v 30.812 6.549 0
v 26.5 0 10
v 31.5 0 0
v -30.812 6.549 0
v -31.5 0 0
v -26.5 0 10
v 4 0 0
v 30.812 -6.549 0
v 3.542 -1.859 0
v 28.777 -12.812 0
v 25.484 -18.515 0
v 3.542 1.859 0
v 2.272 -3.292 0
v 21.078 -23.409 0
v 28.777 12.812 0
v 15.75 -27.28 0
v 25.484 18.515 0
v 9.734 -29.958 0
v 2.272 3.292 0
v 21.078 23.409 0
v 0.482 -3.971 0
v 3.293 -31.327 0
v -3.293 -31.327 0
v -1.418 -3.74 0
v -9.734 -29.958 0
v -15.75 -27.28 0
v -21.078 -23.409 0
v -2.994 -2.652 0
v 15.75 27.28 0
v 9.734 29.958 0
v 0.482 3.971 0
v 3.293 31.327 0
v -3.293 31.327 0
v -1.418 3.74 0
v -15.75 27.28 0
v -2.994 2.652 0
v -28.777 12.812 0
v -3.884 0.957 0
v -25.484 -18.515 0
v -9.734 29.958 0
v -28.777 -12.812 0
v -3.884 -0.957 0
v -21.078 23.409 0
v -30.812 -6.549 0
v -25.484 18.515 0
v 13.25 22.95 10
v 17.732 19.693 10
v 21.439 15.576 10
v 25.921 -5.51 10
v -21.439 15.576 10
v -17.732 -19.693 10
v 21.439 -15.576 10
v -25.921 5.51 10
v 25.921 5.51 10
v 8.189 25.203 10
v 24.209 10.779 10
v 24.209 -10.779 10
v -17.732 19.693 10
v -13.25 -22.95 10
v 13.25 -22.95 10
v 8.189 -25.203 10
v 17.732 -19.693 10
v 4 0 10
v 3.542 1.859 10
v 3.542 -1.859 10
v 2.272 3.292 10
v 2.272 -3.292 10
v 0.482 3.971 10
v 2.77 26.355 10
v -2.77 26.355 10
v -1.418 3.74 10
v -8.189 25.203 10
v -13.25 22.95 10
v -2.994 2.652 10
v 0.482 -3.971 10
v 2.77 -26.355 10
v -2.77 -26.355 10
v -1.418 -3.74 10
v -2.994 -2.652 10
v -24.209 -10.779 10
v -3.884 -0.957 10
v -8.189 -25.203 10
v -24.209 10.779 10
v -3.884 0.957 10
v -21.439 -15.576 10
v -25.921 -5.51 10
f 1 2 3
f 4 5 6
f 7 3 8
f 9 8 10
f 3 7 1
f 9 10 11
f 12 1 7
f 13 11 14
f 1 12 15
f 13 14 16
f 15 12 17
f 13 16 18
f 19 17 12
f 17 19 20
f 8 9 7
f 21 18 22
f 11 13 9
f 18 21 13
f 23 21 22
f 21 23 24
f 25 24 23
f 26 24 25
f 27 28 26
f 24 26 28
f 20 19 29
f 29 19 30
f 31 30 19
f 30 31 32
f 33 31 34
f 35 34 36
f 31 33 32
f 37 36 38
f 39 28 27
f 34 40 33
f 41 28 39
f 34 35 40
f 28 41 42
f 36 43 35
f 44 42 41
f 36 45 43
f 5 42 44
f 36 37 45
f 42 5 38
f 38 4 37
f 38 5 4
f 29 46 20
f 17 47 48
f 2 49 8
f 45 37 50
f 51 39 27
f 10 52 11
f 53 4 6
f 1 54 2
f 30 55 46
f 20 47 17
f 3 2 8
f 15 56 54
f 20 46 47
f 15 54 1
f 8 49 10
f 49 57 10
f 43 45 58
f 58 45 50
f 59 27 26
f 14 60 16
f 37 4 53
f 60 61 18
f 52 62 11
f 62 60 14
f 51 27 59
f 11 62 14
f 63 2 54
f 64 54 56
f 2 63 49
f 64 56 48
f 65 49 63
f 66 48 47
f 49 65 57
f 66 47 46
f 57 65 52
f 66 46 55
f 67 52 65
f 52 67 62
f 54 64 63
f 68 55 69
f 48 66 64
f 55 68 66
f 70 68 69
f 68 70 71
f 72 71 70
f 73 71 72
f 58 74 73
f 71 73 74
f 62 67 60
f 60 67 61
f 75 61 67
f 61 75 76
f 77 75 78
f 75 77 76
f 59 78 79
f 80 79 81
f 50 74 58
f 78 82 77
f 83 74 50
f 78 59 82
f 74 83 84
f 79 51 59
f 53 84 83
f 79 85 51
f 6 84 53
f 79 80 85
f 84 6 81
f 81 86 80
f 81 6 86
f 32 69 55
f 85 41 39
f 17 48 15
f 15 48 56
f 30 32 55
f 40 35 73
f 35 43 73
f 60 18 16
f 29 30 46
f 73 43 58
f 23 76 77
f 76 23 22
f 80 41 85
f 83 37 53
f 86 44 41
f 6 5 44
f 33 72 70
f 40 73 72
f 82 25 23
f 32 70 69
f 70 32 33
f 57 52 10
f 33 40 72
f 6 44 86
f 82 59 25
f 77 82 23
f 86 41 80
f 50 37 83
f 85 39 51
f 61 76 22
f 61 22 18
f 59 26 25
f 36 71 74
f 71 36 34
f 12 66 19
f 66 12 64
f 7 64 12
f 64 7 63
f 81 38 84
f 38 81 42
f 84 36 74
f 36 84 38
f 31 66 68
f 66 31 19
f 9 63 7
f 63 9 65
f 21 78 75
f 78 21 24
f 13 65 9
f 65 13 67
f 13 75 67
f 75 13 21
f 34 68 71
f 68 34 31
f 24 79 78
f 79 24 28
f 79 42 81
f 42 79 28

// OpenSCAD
// file: common.scad
roll_diameter = 200;
roll_inner_diameter = 58;
roll_width = 72; 

roller_diameter= 22;
roller_diameter_inner= 10;
roller_width_inner=8;
roller_width = roller_width_inner + 2;

roll_center_height= roll_diameter/2 + 20;


holder_length = 160 ;
roll_adapter_width=10;

module roll() {
    difference(){
        cylinder(roll_width, d=roll_diameter);
        translate([0,0,-1])
            cylinder(roll_width+2, d=roll_inner_diameter);
    }
}

module roller(){
       cylinder(roller_width, d=roller_diameter);
}
// main file
include <./common.scad>

roll_adapter_diameter_clearence = 5;
roll_adapter_diameter_outer= roll_inner_diameter + roll_adapter_diameter_clearence;
roll_adapter_diameter_inner= roll_inner_diameter - roll_adapter_diameter_clearence;

module roll_adapter(){
    difference(){
       cylinder(roll_adapter_width, d1=roll_adapter_diameter_outer, d2=roll_adapter_diameter_inner);
        
        #
        translate([0,0,-roll_adapter_width])
        cylinder(roll_adapter_width *3, d=roller_width_inner);
    }
}

roll_adapter();
